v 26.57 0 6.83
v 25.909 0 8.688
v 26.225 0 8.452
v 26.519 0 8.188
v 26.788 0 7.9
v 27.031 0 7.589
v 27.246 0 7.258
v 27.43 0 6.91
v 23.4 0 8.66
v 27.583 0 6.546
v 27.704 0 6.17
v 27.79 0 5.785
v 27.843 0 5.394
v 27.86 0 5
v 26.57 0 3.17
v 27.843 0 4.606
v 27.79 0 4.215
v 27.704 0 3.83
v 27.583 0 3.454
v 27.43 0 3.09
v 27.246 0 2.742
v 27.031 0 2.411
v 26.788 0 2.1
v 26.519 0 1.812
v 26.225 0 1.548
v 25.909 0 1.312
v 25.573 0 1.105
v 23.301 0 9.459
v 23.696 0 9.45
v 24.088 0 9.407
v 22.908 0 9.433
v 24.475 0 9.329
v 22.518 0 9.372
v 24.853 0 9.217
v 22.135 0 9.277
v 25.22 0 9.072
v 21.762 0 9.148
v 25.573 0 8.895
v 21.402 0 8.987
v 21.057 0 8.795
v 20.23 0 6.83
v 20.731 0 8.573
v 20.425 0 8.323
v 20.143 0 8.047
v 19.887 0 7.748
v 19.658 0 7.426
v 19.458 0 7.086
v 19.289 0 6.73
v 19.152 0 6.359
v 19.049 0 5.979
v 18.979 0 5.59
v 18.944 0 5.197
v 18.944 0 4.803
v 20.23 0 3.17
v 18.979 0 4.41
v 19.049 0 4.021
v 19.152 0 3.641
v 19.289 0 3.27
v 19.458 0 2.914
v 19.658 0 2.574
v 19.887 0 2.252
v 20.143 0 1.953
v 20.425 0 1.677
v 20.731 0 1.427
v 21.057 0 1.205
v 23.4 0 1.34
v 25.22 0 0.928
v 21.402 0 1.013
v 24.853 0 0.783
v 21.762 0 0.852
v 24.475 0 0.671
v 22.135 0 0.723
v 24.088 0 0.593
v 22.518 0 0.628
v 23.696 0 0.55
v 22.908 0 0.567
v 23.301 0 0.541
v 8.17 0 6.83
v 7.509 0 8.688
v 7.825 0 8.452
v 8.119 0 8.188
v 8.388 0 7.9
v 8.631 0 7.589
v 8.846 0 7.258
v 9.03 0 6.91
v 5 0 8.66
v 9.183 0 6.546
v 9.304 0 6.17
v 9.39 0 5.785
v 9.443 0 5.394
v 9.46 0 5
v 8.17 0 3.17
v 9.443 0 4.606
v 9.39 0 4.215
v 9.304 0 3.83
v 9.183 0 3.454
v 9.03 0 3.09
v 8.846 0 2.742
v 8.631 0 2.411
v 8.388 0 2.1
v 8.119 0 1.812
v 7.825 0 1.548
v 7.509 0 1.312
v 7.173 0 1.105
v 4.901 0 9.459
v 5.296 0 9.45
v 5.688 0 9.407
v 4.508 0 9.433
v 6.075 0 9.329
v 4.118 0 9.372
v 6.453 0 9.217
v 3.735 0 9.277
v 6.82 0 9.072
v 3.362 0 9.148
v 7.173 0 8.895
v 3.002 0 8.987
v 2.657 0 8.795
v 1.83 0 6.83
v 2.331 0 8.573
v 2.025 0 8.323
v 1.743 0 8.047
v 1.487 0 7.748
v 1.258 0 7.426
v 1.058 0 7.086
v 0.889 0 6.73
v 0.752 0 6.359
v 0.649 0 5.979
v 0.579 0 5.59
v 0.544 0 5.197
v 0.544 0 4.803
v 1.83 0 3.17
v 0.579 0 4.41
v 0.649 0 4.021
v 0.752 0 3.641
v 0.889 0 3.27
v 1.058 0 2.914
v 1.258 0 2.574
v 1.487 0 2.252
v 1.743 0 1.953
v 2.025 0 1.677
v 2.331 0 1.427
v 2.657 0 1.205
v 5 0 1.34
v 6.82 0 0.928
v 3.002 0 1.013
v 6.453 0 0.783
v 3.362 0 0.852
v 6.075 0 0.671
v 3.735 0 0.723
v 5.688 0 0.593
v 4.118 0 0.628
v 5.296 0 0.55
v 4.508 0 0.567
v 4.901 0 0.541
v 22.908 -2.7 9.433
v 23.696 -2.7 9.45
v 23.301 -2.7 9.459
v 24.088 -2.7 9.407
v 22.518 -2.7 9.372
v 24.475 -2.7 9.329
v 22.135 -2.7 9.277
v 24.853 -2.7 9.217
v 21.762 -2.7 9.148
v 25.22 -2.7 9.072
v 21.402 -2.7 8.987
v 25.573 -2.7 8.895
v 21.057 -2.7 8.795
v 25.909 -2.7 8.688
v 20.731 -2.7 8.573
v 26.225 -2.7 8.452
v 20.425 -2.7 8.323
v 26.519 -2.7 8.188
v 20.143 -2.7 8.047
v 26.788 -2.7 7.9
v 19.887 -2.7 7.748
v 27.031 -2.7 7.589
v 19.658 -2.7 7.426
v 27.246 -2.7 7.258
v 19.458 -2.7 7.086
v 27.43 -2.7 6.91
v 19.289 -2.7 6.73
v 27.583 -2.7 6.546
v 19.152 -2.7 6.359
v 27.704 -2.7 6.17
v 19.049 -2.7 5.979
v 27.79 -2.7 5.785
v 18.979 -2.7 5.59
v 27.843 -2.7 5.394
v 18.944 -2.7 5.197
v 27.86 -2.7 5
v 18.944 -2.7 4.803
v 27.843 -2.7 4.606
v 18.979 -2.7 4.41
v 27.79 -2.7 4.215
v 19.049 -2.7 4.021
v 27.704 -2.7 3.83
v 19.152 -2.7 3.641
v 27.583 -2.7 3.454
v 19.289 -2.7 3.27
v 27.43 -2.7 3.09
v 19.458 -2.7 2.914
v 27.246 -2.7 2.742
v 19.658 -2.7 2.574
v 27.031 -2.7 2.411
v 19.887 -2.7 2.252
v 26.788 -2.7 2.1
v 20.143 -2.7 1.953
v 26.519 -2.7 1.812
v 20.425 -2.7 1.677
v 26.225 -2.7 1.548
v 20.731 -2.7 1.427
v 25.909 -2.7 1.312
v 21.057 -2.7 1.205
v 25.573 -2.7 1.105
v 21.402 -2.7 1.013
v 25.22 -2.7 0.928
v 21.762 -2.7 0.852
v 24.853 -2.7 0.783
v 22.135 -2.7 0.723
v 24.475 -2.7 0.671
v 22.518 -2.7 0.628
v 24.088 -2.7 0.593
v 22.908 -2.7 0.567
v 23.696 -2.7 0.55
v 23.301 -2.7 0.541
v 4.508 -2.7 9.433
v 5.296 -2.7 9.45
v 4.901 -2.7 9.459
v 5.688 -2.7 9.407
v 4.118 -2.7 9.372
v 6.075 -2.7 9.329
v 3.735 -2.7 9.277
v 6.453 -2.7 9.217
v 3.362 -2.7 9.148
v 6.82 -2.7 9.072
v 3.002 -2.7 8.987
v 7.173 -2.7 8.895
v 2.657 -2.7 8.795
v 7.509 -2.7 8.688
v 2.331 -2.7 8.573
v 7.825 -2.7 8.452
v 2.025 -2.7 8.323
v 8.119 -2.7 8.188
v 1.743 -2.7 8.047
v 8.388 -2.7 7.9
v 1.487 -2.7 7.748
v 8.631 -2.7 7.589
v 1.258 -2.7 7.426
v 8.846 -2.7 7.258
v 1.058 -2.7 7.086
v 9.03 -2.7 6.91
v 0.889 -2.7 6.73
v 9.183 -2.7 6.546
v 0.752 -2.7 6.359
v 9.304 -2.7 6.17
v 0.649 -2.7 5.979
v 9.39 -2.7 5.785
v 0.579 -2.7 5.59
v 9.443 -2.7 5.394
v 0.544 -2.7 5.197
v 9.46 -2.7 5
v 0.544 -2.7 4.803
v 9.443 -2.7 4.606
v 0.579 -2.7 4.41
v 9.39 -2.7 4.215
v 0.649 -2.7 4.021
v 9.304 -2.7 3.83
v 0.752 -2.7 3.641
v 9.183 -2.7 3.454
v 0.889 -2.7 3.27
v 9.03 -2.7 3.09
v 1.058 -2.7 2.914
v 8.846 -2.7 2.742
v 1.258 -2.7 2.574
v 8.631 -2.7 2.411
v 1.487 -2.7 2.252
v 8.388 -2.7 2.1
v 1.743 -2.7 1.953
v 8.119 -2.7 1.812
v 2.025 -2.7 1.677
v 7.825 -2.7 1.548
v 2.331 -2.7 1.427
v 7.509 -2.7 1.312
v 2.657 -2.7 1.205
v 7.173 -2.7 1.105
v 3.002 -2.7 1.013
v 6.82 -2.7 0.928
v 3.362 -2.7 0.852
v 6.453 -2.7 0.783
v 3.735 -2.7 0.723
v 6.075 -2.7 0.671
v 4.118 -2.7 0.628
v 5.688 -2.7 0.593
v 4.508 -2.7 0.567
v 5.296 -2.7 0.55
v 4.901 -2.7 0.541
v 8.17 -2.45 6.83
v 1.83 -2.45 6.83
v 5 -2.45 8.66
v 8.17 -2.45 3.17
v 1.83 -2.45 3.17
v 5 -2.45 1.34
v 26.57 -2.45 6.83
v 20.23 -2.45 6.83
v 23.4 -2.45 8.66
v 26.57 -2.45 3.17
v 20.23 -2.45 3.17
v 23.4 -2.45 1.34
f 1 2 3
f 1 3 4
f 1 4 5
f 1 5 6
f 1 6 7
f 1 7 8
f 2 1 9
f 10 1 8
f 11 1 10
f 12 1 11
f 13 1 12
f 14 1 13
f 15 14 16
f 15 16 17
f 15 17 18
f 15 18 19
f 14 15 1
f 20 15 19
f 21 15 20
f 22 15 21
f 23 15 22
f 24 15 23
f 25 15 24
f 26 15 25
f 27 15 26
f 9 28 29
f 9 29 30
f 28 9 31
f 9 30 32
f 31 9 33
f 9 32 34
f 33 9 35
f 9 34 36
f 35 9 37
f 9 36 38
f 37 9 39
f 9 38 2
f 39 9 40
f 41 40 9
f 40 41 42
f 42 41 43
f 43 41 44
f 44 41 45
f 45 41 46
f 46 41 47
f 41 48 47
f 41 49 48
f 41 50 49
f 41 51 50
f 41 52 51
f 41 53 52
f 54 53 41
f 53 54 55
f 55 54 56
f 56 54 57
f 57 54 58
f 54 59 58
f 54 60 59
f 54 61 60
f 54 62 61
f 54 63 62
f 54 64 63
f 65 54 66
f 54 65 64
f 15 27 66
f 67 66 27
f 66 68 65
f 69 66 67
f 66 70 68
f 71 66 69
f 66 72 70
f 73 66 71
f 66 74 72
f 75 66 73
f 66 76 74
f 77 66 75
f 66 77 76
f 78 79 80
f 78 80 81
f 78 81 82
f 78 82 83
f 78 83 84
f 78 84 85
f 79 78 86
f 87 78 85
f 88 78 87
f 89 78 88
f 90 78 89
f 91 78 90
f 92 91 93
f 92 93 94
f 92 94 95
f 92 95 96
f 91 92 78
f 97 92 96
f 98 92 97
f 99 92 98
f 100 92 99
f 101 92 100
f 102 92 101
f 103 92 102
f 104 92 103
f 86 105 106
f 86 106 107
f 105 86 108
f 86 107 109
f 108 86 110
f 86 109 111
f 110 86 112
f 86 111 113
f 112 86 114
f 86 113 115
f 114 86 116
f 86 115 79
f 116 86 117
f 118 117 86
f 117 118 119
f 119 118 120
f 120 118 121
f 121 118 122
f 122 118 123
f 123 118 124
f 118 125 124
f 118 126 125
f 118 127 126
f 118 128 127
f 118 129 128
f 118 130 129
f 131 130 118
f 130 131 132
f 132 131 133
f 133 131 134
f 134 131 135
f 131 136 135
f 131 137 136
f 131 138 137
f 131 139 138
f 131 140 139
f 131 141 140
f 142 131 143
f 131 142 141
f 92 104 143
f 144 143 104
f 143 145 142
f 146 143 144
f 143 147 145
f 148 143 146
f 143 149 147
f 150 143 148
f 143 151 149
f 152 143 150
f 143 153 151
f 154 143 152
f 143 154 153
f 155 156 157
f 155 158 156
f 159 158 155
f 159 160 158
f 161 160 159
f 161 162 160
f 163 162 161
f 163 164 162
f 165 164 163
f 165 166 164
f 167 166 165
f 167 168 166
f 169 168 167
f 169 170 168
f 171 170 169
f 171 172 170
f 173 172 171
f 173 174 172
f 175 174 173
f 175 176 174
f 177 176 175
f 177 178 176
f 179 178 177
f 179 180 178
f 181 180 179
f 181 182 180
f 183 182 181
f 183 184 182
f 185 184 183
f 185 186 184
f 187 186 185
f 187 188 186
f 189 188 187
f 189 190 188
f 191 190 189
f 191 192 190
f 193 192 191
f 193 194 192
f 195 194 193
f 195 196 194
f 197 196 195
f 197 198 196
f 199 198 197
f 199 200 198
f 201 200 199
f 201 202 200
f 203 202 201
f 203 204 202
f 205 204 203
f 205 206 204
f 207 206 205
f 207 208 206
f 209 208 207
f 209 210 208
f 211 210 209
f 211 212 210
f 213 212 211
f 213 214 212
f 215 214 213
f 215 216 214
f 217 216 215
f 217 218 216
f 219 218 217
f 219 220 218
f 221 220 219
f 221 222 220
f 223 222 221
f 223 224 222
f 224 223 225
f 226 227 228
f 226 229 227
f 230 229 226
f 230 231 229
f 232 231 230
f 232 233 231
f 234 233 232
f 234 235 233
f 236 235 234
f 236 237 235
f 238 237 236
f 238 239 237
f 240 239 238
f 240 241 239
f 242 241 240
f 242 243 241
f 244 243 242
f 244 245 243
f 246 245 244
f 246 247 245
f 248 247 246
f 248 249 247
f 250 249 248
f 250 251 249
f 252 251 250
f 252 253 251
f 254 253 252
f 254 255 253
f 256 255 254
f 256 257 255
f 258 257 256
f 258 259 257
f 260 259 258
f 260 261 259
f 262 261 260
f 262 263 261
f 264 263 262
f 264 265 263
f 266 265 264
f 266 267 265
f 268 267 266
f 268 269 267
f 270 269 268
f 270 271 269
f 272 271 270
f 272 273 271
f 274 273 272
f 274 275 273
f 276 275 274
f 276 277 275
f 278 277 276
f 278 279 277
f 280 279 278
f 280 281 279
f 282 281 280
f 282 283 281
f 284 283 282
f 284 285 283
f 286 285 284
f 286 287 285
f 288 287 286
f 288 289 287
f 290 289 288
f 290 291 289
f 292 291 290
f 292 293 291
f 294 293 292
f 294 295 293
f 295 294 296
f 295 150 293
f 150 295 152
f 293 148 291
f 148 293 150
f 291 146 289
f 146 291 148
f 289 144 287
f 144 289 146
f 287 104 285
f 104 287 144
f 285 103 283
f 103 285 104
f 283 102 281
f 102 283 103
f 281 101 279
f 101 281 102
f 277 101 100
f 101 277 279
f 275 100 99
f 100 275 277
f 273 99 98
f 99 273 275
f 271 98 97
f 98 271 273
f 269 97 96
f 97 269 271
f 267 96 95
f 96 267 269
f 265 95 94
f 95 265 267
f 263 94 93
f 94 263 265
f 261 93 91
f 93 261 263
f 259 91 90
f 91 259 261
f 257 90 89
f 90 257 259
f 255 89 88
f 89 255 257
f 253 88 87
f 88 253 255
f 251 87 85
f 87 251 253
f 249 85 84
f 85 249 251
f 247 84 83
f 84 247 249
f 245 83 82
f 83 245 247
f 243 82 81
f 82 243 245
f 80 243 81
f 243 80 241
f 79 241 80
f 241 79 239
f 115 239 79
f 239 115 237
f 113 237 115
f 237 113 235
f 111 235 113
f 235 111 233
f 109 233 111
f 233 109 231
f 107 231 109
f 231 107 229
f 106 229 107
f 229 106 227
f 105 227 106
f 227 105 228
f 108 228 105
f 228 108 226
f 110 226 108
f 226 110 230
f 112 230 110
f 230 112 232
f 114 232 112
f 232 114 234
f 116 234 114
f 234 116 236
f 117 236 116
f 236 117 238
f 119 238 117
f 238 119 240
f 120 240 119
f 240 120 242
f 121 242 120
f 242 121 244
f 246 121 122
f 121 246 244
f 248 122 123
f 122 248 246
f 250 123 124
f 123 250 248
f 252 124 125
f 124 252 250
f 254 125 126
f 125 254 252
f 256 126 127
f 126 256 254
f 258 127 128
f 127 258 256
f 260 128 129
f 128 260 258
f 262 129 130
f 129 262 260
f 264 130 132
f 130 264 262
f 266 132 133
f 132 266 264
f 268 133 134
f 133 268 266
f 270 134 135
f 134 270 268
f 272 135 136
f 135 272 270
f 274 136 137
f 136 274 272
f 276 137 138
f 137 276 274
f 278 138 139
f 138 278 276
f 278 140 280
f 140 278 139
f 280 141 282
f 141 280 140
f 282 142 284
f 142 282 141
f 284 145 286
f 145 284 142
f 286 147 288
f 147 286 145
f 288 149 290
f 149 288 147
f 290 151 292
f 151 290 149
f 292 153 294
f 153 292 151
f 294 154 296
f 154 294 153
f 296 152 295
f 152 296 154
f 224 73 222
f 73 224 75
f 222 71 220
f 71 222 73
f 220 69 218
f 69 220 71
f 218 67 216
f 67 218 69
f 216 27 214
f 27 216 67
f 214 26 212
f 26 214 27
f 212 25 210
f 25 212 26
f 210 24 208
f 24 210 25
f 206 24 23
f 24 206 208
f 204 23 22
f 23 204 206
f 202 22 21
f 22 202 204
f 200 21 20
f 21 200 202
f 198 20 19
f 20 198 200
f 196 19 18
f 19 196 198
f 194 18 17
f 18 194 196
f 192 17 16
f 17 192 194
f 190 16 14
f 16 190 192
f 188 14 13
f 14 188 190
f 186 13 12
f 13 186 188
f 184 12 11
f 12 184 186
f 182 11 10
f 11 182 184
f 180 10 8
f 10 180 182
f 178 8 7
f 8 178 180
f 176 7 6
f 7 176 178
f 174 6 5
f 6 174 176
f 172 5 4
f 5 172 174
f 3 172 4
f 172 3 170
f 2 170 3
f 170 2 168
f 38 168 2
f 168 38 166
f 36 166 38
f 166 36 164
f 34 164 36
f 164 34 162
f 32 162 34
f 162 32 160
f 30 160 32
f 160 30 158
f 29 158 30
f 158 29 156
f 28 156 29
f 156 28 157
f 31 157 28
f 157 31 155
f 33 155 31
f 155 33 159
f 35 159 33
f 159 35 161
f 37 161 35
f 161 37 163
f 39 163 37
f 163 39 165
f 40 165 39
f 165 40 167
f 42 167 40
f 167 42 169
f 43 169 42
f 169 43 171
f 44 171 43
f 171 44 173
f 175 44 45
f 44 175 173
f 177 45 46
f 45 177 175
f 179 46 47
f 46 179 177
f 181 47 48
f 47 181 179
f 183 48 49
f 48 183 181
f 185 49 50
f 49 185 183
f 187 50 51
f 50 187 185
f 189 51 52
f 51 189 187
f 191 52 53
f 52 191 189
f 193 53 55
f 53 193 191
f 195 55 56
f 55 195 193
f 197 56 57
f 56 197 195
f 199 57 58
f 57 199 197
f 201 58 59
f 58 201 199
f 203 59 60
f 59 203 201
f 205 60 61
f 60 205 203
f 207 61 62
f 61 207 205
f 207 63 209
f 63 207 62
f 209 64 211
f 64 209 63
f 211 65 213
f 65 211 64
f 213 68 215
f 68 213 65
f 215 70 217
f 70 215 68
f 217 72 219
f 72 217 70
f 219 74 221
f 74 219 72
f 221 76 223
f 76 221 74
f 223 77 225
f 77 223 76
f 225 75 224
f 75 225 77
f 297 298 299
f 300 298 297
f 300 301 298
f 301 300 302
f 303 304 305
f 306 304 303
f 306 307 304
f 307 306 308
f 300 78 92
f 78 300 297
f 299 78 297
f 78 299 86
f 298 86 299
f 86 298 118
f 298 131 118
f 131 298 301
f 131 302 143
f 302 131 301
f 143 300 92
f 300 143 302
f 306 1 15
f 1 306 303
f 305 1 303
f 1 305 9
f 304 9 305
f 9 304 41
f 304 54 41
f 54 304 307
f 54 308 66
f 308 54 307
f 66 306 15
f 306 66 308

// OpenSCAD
// Copyright (C) 2025 Arif K. Rafiq
// This program is free software: you can redistribute it and/or modify
// it under the terms of the GNU General Public License as published by
// the Free Software Foundation, either version 3 of the License, or
// (at your option) any later version.

// This program is distributed in the hope that it will be useful,
// but WITHOUT ANY WARRANTY; without even the implied warranty of
// MERCHANTABILITY or FITNESS FOR A PARTICULAR PURPOSE.  See the
// GNU General Public License for more details.

// You should have received a copy of the GNU General Public License
// along with this file.  If not, see <https://www.gnu.org/licenses/>,
// or write to: license@temperedoptimism.com



// Fixed in example3.scad       // Set limits in customizer
/* [Thicknesses (x),(y),(z)] */
tFitGap = [0.16, 0.16, 0.16];   //[0.00:0.01:0.64] 
tWallMin = [0.40, 0.40, 0.16];  //[0.16:0.08:1.60] 
/* [Proportional (x):(Radius, (y):(i)ntensity] */
pHexSink = [3.5, 2.3];          //[0.10:0.02:20.00] 
/* [2D vectors (x), (y)] */
vTerminal0 = [5.0, 5.0];        //[0.00:0.10:100] 
vTerminal1 = [23.4, 5.0];       //[0.00:0.10:100] 
/* [Special] */
fa0 = 4.0;     //[1:1:60]  
fs0 = 0.4;     //[0.1:0.1:4.0]  
fx0 = 2;       //[1,2,3,4,5,6,7,8,9,10]
// * [Hidden] */ Does not show up
tEps=0.01; 

//30.00-35.00 Circles, Also look at the customizer!!
// Rotate
rotate([90,0,0]){
  difference(){

    linear_extrude(pHexSink.y+ tWallMin.y, convexity=fx0){  
      translate(vTerminal0)  circle(pHexSink.x +(tWallMin.x *2) + tFitGap.x, $fa=fa0, $fs=fs0); 
      translate(vTerminal1)  circle(pHexSink.x +(tWallMin.x *2) + tFitGap.x, $fa=fa0, $fs=fs0 );
    }
    //hex pocket
    // Solve Conflicting bodies                       
    translate([0,0, -tEps]) linear_extrude(pHexSink.y + tFitGap.y, convexity=fx0){
      translate(vTerminal0)  rotate([0,0,30]) circle(pHexSink.x + tFitGap.y, $fn=6);
      translate(vTerminal1)  rotate([0,0,30]) circle(pHexSink.x + tFitGap.y, $fn=6);
    }
  }
}
